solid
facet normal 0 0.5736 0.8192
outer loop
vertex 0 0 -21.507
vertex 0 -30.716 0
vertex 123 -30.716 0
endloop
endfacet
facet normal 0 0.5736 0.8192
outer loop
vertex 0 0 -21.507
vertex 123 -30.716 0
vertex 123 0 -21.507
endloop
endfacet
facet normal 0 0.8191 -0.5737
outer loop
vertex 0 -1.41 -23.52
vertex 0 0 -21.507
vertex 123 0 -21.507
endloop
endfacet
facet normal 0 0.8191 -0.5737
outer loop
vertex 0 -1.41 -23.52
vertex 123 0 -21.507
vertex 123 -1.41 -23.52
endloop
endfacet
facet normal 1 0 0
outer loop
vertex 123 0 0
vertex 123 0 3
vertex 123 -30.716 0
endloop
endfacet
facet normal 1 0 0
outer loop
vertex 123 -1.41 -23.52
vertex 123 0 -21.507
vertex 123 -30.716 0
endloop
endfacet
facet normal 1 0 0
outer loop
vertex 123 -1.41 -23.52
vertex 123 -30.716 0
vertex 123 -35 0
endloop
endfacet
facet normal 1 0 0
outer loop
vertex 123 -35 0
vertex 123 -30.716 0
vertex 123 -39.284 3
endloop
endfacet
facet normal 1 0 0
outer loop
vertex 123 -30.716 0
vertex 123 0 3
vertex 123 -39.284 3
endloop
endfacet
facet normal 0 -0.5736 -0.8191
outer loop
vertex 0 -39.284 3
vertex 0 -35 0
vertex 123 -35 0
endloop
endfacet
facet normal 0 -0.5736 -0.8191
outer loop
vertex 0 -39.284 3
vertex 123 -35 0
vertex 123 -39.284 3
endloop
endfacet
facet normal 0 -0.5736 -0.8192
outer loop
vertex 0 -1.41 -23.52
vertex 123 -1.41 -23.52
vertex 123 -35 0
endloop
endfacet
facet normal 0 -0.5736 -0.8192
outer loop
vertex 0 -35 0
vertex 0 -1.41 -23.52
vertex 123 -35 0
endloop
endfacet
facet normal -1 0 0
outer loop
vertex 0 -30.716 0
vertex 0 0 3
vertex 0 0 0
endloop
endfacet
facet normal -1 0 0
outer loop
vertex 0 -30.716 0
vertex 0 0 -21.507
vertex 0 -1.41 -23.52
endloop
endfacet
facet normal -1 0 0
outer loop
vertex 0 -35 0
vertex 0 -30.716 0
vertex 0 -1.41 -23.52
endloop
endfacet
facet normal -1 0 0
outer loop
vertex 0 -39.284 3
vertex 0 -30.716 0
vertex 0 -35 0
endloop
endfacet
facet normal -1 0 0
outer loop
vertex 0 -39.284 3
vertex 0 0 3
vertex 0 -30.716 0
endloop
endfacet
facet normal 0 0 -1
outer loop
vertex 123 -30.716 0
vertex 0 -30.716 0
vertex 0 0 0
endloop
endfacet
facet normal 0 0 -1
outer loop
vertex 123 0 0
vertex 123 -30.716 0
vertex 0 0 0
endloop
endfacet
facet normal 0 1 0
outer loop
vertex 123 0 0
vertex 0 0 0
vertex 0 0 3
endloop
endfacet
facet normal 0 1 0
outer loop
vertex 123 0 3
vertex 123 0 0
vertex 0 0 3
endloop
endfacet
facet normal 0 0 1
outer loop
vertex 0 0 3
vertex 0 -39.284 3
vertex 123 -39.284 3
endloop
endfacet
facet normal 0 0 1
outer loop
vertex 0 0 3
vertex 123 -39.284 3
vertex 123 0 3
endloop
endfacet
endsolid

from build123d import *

# Parameters (mm, degrees)
F0_W     = 35
F0_H     = 3
F1_DEPTH = 123
F3_DEPTH = 123


with BuildPart() as f1:
    # F0 (on Right) → F1 (new body)
    with BuildSketch(Plane.YZ):
        with Locations((-17.5, 1.5)):
            Rectangle(F0_W, F0_H)
    extrude(amount=F1_DEPTH)

    # F2 (on face) → F3 (join, through all)
    with BuildSketch(Plane(origin=(0, 0, 0), x_dir=(0, -1, 0), z_dir=(-1, 0, 0))):
        Polygon((39.284444, 3), (35, 3), (0, -21.507264), (1.409539, -23.520294), (35, 0), align=None)
        Polygon((35, 0), (30.715556, 0), (0, -21.507264), (1.409539, -23.520294), align=None)
    extrude(amount=-F3_DEPTH)


solid = f1.part
